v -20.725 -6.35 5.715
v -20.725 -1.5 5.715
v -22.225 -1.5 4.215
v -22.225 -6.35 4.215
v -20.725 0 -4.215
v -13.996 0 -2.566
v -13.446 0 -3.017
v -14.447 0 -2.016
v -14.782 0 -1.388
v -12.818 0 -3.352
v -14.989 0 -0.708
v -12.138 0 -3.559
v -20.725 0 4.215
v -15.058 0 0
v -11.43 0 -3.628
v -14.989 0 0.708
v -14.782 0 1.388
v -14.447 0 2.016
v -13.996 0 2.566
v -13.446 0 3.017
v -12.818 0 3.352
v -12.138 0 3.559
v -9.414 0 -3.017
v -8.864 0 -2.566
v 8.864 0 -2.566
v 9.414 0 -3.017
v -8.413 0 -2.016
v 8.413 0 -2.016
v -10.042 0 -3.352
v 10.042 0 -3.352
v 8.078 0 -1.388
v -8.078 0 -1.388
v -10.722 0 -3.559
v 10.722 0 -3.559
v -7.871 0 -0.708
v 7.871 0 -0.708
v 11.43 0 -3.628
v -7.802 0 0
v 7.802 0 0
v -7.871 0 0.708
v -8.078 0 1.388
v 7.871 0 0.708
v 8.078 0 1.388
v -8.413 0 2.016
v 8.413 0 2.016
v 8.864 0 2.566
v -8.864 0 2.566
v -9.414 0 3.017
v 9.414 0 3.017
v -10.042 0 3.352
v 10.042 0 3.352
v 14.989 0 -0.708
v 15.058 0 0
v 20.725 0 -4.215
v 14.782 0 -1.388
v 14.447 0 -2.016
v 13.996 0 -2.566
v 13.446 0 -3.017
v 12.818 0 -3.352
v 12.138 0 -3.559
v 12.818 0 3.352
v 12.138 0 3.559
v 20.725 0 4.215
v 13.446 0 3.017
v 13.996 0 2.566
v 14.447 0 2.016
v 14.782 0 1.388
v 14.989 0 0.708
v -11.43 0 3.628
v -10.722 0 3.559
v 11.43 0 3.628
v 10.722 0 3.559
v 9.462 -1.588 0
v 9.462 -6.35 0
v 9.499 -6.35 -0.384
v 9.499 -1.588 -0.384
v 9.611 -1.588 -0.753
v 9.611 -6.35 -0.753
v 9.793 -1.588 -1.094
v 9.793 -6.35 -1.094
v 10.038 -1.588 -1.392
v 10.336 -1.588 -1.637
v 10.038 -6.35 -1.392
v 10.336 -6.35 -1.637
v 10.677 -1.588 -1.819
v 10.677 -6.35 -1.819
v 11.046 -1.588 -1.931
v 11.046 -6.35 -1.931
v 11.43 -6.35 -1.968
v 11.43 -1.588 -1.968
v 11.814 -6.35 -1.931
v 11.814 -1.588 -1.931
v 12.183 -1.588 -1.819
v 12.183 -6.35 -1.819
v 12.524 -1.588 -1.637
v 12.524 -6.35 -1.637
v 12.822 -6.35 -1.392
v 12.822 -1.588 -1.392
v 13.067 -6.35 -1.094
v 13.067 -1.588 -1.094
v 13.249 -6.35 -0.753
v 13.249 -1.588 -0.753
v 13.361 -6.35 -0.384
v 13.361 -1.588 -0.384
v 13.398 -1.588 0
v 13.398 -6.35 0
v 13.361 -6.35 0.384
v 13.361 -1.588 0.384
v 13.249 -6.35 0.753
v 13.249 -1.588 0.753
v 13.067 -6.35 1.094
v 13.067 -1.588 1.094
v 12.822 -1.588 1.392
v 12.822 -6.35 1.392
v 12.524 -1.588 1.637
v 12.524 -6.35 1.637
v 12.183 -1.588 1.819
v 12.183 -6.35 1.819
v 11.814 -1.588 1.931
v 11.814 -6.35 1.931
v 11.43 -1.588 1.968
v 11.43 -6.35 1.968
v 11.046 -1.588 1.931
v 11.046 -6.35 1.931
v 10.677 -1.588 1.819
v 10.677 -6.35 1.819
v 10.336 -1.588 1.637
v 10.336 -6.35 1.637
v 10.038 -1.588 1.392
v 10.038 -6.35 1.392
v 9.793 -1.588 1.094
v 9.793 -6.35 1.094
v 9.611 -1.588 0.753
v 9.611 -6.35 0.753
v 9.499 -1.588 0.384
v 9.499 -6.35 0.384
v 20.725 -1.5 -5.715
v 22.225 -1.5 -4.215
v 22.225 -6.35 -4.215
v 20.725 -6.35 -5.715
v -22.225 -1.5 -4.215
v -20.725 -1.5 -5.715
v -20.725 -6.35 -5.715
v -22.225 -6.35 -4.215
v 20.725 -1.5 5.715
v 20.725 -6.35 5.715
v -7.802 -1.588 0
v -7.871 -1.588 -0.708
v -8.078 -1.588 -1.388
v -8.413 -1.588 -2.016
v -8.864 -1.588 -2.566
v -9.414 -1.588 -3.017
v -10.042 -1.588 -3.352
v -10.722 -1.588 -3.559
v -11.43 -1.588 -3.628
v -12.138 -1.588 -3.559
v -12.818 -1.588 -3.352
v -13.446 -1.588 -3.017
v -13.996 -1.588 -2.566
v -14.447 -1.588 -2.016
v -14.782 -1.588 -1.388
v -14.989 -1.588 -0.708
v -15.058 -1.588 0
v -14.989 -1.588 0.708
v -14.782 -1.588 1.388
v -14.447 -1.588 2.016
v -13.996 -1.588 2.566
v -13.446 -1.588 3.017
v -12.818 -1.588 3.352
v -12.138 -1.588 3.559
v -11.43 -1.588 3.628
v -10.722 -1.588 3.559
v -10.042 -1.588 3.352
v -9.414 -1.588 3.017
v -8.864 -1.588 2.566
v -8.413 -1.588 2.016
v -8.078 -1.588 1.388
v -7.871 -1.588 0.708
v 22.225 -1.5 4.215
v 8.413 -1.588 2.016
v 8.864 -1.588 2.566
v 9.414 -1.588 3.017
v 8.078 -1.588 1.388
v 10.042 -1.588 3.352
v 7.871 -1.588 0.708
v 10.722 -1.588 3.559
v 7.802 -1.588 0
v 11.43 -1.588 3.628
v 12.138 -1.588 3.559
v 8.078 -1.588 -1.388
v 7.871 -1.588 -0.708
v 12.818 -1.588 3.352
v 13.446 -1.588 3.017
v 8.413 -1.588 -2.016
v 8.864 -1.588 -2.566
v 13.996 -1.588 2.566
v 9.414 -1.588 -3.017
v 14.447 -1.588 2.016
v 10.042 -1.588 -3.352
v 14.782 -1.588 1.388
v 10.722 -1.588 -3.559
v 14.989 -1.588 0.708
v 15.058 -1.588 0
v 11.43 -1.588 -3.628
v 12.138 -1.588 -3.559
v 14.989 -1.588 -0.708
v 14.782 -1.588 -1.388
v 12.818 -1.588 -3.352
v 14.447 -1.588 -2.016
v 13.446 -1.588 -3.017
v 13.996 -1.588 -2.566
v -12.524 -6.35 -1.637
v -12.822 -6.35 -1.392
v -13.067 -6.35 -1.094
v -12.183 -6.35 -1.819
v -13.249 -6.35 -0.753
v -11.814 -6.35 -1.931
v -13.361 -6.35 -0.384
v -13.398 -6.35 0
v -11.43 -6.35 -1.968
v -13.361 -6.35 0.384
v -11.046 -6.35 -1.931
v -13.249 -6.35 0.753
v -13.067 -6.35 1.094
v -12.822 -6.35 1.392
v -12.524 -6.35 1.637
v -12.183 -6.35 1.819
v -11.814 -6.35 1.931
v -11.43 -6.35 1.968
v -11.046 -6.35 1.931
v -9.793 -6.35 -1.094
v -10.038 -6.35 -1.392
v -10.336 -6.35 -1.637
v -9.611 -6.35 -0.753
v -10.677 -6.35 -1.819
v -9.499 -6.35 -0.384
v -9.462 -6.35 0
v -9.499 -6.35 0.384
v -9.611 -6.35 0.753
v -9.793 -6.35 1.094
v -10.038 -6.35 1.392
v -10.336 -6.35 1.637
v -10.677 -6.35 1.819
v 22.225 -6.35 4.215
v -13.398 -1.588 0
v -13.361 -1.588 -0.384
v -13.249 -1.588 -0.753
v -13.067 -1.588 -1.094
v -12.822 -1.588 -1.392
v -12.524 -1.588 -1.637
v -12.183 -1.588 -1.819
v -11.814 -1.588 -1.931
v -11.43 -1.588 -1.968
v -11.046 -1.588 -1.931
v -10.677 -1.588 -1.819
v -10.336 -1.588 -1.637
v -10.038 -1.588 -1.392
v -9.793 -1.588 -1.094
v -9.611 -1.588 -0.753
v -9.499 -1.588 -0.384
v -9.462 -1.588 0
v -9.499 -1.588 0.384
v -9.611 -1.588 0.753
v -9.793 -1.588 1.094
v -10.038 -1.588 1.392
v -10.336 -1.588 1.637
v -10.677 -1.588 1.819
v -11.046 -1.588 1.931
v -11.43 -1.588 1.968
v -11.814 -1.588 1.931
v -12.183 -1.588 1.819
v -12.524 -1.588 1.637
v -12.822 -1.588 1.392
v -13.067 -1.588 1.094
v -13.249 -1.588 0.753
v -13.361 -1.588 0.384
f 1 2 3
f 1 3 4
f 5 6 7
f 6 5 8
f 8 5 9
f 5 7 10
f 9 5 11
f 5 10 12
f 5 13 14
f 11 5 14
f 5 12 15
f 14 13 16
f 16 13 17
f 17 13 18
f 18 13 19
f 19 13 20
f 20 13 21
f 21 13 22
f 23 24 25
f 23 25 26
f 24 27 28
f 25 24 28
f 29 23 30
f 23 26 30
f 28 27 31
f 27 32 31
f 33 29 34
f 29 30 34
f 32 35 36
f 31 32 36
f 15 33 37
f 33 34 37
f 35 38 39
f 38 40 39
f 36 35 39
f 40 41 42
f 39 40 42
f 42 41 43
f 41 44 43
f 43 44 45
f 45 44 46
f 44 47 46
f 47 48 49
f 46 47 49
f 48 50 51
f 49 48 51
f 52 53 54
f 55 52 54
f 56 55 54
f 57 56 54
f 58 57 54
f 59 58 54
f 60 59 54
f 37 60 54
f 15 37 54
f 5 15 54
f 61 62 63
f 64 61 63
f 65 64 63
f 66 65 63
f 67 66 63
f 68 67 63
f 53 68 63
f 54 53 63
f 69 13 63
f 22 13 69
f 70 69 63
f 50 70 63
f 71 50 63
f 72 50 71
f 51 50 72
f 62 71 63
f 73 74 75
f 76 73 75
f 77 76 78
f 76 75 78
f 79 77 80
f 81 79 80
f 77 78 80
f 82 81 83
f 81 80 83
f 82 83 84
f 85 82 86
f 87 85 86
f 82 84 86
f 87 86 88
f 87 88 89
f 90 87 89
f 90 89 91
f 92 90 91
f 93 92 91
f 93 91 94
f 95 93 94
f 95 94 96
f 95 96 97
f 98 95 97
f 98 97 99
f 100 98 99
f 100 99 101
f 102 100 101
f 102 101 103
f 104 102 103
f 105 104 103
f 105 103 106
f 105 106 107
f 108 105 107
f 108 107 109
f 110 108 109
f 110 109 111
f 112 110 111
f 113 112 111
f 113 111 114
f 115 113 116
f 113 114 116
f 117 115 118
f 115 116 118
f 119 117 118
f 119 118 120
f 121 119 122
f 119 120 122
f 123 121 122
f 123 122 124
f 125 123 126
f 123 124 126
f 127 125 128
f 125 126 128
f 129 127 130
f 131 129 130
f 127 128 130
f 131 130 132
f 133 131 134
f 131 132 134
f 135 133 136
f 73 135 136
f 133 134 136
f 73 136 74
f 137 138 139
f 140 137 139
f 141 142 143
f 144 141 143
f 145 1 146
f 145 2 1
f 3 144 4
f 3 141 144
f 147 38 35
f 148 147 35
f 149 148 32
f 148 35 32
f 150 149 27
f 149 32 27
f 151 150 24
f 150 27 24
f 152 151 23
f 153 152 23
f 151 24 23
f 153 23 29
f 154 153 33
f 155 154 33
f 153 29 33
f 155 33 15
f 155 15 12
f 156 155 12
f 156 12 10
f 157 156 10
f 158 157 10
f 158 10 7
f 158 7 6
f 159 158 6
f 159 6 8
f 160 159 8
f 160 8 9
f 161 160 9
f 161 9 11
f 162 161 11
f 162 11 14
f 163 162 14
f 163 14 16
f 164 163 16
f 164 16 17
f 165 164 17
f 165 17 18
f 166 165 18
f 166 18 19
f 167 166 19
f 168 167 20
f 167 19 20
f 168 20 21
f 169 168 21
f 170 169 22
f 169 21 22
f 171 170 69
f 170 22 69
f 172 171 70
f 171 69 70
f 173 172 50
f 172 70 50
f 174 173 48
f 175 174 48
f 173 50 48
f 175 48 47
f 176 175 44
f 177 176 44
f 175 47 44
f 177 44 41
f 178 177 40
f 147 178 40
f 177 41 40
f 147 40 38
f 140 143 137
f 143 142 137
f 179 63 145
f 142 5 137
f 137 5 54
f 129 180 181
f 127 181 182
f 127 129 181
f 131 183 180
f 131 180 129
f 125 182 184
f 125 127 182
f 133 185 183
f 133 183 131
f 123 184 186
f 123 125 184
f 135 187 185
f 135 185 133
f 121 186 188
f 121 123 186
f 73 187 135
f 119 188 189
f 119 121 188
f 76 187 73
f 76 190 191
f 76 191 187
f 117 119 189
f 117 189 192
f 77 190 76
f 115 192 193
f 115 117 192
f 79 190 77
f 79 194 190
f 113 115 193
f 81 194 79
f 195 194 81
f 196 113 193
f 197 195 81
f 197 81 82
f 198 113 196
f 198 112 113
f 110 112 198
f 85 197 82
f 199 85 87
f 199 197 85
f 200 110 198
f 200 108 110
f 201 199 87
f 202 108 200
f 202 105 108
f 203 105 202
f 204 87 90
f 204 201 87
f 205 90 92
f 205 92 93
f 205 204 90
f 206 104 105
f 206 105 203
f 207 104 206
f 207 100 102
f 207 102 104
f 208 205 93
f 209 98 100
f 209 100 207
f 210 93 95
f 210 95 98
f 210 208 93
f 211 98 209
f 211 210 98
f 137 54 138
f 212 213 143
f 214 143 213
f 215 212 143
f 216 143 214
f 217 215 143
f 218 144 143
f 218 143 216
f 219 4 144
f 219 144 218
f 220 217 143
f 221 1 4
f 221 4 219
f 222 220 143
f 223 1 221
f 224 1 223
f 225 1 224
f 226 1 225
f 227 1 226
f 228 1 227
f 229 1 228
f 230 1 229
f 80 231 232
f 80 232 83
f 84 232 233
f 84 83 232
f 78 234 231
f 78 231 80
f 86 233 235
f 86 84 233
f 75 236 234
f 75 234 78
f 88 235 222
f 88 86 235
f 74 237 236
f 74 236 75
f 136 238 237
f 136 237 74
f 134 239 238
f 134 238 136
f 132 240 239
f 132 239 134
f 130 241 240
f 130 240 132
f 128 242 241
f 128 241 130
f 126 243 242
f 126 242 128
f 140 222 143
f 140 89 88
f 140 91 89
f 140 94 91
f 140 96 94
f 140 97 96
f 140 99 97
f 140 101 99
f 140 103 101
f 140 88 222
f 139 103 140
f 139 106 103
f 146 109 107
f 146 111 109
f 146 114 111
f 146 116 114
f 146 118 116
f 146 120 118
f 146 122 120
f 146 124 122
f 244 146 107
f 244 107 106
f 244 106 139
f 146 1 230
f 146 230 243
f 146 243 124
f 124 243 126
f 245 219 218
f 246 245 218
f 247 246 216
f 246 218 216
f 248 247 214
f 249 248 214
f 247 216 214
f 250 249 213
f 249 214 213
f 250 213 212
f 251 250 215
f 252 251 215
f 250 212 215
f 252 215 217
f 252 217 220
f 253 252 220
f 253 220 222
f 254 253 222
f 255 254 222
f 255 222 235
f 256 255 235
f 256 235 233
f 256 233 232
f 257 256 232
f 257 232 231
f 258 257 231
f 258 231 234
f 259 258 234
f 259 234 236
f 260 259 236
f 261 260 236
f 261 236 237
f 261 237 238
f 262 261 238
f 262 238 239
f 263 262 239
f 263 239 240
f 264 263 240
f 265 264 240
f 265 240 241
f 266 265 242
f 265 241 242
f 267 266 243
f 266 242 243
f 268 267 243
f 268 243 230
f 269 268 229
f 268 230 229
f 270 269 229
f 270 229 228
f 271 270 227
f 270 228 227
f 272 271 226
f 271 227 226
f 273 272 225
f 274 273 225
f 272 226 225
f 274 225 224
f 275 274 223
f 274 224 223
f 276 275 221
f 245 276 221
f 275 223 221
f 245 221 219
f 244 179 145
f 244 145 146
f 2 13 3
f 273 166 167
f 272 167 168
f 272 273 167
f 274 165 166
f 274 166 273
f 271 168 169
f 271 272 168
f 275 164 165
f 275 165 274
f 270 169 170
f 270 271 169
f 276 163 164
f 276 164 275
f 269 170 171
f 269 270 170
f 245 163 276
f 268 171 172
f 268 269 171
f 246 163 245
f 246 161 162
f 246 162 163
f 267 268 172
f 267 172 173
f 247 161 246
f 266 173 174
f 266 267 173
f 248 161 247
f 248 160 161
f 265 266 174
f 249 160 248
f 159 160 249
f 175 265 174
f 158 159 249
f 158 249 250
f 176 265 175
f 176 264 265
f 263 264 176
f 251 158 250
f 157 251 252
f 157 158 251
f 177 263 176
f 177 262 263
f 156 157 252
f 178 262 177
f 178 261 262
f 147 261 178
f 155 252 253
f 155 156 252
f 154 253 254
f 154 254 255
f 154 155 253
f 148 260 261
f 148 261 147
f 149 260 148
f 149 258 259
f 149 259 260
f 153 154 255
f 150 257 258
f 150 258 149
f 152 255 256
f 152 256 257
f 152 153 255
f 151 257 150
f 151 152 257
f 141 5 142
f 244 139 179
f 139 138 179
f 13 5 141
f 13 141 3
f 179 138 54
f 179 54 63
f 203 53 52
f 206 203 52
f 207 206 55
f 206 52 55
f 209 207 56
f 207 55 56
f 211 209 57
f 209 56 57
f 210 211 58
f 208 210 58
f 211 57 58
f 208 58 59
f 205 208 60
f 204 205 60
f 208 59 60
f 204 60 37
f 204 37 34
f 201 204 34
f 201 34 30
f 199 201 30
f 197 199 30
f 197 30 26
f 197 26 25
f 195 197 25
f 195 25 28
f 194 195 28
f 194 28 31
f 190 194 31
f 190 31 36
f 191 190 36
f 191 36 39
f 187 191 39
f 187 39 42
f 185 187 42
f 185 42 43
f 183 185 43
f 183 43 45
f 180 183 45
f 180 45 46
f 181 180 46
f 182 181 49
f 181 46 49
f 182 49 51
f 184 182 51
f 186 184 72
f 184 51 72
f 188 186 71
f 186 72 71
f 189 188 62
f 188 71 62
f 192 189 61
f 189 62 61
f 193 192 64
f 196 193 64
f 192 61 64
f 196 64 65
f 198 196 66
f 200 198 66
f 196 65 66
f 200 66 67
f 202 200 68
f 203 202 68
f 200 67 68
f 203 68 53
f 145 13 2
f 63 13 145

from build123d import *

# Parameters (mm, degrees)
F0_W           = 44.45
F0_H           = 11.43
F1_DEPTH       = 6.35
F2_D           = 3.937
F2_DEPTH       = 6.35
F2_CBORE_D     = 7.256526
F2_CBORE_DEPTH = 1.5875
F3_SIZE        = 1.5


with BuildPart() as f1:
    # F0 (on Front) → F1 (new body)
    with BuildSketch(Plane.XZ):
        Rectangle(F0_W, F0_H)
    extrude(amount=F1_DEPTH)

    # F2
    with Locations(Plane(origin=(0, 0, 0), x_dir=(1, 0, 0), z_dir=(0, 1, 0))):
        with Locations((-11.43, 0), (11.43, 0)):
            CounterBoreHole(F2_D / 2, F2_CBORE_D / 2, F2_CBORE_DEPTH, depth=F2_DEPTH)

    # F3
    f3_edges = [f1.edges().sort_by_distance(p)[0] for p in [
        (0, 0, 5.715),
        (0, 0, -5.715),
        (22.225, 0, 0),
        (-22.225, 0, 0),
        (22.225, -3.175, -5.715),
        (22.225, -3.175, 5.715),
        (-22.225, -3.175, 5.715),
        (-22.225, -3.175, -5.715),
    ]]
    chamfer(f3_edges, length=F3_SIZE)


solid = f1.part
